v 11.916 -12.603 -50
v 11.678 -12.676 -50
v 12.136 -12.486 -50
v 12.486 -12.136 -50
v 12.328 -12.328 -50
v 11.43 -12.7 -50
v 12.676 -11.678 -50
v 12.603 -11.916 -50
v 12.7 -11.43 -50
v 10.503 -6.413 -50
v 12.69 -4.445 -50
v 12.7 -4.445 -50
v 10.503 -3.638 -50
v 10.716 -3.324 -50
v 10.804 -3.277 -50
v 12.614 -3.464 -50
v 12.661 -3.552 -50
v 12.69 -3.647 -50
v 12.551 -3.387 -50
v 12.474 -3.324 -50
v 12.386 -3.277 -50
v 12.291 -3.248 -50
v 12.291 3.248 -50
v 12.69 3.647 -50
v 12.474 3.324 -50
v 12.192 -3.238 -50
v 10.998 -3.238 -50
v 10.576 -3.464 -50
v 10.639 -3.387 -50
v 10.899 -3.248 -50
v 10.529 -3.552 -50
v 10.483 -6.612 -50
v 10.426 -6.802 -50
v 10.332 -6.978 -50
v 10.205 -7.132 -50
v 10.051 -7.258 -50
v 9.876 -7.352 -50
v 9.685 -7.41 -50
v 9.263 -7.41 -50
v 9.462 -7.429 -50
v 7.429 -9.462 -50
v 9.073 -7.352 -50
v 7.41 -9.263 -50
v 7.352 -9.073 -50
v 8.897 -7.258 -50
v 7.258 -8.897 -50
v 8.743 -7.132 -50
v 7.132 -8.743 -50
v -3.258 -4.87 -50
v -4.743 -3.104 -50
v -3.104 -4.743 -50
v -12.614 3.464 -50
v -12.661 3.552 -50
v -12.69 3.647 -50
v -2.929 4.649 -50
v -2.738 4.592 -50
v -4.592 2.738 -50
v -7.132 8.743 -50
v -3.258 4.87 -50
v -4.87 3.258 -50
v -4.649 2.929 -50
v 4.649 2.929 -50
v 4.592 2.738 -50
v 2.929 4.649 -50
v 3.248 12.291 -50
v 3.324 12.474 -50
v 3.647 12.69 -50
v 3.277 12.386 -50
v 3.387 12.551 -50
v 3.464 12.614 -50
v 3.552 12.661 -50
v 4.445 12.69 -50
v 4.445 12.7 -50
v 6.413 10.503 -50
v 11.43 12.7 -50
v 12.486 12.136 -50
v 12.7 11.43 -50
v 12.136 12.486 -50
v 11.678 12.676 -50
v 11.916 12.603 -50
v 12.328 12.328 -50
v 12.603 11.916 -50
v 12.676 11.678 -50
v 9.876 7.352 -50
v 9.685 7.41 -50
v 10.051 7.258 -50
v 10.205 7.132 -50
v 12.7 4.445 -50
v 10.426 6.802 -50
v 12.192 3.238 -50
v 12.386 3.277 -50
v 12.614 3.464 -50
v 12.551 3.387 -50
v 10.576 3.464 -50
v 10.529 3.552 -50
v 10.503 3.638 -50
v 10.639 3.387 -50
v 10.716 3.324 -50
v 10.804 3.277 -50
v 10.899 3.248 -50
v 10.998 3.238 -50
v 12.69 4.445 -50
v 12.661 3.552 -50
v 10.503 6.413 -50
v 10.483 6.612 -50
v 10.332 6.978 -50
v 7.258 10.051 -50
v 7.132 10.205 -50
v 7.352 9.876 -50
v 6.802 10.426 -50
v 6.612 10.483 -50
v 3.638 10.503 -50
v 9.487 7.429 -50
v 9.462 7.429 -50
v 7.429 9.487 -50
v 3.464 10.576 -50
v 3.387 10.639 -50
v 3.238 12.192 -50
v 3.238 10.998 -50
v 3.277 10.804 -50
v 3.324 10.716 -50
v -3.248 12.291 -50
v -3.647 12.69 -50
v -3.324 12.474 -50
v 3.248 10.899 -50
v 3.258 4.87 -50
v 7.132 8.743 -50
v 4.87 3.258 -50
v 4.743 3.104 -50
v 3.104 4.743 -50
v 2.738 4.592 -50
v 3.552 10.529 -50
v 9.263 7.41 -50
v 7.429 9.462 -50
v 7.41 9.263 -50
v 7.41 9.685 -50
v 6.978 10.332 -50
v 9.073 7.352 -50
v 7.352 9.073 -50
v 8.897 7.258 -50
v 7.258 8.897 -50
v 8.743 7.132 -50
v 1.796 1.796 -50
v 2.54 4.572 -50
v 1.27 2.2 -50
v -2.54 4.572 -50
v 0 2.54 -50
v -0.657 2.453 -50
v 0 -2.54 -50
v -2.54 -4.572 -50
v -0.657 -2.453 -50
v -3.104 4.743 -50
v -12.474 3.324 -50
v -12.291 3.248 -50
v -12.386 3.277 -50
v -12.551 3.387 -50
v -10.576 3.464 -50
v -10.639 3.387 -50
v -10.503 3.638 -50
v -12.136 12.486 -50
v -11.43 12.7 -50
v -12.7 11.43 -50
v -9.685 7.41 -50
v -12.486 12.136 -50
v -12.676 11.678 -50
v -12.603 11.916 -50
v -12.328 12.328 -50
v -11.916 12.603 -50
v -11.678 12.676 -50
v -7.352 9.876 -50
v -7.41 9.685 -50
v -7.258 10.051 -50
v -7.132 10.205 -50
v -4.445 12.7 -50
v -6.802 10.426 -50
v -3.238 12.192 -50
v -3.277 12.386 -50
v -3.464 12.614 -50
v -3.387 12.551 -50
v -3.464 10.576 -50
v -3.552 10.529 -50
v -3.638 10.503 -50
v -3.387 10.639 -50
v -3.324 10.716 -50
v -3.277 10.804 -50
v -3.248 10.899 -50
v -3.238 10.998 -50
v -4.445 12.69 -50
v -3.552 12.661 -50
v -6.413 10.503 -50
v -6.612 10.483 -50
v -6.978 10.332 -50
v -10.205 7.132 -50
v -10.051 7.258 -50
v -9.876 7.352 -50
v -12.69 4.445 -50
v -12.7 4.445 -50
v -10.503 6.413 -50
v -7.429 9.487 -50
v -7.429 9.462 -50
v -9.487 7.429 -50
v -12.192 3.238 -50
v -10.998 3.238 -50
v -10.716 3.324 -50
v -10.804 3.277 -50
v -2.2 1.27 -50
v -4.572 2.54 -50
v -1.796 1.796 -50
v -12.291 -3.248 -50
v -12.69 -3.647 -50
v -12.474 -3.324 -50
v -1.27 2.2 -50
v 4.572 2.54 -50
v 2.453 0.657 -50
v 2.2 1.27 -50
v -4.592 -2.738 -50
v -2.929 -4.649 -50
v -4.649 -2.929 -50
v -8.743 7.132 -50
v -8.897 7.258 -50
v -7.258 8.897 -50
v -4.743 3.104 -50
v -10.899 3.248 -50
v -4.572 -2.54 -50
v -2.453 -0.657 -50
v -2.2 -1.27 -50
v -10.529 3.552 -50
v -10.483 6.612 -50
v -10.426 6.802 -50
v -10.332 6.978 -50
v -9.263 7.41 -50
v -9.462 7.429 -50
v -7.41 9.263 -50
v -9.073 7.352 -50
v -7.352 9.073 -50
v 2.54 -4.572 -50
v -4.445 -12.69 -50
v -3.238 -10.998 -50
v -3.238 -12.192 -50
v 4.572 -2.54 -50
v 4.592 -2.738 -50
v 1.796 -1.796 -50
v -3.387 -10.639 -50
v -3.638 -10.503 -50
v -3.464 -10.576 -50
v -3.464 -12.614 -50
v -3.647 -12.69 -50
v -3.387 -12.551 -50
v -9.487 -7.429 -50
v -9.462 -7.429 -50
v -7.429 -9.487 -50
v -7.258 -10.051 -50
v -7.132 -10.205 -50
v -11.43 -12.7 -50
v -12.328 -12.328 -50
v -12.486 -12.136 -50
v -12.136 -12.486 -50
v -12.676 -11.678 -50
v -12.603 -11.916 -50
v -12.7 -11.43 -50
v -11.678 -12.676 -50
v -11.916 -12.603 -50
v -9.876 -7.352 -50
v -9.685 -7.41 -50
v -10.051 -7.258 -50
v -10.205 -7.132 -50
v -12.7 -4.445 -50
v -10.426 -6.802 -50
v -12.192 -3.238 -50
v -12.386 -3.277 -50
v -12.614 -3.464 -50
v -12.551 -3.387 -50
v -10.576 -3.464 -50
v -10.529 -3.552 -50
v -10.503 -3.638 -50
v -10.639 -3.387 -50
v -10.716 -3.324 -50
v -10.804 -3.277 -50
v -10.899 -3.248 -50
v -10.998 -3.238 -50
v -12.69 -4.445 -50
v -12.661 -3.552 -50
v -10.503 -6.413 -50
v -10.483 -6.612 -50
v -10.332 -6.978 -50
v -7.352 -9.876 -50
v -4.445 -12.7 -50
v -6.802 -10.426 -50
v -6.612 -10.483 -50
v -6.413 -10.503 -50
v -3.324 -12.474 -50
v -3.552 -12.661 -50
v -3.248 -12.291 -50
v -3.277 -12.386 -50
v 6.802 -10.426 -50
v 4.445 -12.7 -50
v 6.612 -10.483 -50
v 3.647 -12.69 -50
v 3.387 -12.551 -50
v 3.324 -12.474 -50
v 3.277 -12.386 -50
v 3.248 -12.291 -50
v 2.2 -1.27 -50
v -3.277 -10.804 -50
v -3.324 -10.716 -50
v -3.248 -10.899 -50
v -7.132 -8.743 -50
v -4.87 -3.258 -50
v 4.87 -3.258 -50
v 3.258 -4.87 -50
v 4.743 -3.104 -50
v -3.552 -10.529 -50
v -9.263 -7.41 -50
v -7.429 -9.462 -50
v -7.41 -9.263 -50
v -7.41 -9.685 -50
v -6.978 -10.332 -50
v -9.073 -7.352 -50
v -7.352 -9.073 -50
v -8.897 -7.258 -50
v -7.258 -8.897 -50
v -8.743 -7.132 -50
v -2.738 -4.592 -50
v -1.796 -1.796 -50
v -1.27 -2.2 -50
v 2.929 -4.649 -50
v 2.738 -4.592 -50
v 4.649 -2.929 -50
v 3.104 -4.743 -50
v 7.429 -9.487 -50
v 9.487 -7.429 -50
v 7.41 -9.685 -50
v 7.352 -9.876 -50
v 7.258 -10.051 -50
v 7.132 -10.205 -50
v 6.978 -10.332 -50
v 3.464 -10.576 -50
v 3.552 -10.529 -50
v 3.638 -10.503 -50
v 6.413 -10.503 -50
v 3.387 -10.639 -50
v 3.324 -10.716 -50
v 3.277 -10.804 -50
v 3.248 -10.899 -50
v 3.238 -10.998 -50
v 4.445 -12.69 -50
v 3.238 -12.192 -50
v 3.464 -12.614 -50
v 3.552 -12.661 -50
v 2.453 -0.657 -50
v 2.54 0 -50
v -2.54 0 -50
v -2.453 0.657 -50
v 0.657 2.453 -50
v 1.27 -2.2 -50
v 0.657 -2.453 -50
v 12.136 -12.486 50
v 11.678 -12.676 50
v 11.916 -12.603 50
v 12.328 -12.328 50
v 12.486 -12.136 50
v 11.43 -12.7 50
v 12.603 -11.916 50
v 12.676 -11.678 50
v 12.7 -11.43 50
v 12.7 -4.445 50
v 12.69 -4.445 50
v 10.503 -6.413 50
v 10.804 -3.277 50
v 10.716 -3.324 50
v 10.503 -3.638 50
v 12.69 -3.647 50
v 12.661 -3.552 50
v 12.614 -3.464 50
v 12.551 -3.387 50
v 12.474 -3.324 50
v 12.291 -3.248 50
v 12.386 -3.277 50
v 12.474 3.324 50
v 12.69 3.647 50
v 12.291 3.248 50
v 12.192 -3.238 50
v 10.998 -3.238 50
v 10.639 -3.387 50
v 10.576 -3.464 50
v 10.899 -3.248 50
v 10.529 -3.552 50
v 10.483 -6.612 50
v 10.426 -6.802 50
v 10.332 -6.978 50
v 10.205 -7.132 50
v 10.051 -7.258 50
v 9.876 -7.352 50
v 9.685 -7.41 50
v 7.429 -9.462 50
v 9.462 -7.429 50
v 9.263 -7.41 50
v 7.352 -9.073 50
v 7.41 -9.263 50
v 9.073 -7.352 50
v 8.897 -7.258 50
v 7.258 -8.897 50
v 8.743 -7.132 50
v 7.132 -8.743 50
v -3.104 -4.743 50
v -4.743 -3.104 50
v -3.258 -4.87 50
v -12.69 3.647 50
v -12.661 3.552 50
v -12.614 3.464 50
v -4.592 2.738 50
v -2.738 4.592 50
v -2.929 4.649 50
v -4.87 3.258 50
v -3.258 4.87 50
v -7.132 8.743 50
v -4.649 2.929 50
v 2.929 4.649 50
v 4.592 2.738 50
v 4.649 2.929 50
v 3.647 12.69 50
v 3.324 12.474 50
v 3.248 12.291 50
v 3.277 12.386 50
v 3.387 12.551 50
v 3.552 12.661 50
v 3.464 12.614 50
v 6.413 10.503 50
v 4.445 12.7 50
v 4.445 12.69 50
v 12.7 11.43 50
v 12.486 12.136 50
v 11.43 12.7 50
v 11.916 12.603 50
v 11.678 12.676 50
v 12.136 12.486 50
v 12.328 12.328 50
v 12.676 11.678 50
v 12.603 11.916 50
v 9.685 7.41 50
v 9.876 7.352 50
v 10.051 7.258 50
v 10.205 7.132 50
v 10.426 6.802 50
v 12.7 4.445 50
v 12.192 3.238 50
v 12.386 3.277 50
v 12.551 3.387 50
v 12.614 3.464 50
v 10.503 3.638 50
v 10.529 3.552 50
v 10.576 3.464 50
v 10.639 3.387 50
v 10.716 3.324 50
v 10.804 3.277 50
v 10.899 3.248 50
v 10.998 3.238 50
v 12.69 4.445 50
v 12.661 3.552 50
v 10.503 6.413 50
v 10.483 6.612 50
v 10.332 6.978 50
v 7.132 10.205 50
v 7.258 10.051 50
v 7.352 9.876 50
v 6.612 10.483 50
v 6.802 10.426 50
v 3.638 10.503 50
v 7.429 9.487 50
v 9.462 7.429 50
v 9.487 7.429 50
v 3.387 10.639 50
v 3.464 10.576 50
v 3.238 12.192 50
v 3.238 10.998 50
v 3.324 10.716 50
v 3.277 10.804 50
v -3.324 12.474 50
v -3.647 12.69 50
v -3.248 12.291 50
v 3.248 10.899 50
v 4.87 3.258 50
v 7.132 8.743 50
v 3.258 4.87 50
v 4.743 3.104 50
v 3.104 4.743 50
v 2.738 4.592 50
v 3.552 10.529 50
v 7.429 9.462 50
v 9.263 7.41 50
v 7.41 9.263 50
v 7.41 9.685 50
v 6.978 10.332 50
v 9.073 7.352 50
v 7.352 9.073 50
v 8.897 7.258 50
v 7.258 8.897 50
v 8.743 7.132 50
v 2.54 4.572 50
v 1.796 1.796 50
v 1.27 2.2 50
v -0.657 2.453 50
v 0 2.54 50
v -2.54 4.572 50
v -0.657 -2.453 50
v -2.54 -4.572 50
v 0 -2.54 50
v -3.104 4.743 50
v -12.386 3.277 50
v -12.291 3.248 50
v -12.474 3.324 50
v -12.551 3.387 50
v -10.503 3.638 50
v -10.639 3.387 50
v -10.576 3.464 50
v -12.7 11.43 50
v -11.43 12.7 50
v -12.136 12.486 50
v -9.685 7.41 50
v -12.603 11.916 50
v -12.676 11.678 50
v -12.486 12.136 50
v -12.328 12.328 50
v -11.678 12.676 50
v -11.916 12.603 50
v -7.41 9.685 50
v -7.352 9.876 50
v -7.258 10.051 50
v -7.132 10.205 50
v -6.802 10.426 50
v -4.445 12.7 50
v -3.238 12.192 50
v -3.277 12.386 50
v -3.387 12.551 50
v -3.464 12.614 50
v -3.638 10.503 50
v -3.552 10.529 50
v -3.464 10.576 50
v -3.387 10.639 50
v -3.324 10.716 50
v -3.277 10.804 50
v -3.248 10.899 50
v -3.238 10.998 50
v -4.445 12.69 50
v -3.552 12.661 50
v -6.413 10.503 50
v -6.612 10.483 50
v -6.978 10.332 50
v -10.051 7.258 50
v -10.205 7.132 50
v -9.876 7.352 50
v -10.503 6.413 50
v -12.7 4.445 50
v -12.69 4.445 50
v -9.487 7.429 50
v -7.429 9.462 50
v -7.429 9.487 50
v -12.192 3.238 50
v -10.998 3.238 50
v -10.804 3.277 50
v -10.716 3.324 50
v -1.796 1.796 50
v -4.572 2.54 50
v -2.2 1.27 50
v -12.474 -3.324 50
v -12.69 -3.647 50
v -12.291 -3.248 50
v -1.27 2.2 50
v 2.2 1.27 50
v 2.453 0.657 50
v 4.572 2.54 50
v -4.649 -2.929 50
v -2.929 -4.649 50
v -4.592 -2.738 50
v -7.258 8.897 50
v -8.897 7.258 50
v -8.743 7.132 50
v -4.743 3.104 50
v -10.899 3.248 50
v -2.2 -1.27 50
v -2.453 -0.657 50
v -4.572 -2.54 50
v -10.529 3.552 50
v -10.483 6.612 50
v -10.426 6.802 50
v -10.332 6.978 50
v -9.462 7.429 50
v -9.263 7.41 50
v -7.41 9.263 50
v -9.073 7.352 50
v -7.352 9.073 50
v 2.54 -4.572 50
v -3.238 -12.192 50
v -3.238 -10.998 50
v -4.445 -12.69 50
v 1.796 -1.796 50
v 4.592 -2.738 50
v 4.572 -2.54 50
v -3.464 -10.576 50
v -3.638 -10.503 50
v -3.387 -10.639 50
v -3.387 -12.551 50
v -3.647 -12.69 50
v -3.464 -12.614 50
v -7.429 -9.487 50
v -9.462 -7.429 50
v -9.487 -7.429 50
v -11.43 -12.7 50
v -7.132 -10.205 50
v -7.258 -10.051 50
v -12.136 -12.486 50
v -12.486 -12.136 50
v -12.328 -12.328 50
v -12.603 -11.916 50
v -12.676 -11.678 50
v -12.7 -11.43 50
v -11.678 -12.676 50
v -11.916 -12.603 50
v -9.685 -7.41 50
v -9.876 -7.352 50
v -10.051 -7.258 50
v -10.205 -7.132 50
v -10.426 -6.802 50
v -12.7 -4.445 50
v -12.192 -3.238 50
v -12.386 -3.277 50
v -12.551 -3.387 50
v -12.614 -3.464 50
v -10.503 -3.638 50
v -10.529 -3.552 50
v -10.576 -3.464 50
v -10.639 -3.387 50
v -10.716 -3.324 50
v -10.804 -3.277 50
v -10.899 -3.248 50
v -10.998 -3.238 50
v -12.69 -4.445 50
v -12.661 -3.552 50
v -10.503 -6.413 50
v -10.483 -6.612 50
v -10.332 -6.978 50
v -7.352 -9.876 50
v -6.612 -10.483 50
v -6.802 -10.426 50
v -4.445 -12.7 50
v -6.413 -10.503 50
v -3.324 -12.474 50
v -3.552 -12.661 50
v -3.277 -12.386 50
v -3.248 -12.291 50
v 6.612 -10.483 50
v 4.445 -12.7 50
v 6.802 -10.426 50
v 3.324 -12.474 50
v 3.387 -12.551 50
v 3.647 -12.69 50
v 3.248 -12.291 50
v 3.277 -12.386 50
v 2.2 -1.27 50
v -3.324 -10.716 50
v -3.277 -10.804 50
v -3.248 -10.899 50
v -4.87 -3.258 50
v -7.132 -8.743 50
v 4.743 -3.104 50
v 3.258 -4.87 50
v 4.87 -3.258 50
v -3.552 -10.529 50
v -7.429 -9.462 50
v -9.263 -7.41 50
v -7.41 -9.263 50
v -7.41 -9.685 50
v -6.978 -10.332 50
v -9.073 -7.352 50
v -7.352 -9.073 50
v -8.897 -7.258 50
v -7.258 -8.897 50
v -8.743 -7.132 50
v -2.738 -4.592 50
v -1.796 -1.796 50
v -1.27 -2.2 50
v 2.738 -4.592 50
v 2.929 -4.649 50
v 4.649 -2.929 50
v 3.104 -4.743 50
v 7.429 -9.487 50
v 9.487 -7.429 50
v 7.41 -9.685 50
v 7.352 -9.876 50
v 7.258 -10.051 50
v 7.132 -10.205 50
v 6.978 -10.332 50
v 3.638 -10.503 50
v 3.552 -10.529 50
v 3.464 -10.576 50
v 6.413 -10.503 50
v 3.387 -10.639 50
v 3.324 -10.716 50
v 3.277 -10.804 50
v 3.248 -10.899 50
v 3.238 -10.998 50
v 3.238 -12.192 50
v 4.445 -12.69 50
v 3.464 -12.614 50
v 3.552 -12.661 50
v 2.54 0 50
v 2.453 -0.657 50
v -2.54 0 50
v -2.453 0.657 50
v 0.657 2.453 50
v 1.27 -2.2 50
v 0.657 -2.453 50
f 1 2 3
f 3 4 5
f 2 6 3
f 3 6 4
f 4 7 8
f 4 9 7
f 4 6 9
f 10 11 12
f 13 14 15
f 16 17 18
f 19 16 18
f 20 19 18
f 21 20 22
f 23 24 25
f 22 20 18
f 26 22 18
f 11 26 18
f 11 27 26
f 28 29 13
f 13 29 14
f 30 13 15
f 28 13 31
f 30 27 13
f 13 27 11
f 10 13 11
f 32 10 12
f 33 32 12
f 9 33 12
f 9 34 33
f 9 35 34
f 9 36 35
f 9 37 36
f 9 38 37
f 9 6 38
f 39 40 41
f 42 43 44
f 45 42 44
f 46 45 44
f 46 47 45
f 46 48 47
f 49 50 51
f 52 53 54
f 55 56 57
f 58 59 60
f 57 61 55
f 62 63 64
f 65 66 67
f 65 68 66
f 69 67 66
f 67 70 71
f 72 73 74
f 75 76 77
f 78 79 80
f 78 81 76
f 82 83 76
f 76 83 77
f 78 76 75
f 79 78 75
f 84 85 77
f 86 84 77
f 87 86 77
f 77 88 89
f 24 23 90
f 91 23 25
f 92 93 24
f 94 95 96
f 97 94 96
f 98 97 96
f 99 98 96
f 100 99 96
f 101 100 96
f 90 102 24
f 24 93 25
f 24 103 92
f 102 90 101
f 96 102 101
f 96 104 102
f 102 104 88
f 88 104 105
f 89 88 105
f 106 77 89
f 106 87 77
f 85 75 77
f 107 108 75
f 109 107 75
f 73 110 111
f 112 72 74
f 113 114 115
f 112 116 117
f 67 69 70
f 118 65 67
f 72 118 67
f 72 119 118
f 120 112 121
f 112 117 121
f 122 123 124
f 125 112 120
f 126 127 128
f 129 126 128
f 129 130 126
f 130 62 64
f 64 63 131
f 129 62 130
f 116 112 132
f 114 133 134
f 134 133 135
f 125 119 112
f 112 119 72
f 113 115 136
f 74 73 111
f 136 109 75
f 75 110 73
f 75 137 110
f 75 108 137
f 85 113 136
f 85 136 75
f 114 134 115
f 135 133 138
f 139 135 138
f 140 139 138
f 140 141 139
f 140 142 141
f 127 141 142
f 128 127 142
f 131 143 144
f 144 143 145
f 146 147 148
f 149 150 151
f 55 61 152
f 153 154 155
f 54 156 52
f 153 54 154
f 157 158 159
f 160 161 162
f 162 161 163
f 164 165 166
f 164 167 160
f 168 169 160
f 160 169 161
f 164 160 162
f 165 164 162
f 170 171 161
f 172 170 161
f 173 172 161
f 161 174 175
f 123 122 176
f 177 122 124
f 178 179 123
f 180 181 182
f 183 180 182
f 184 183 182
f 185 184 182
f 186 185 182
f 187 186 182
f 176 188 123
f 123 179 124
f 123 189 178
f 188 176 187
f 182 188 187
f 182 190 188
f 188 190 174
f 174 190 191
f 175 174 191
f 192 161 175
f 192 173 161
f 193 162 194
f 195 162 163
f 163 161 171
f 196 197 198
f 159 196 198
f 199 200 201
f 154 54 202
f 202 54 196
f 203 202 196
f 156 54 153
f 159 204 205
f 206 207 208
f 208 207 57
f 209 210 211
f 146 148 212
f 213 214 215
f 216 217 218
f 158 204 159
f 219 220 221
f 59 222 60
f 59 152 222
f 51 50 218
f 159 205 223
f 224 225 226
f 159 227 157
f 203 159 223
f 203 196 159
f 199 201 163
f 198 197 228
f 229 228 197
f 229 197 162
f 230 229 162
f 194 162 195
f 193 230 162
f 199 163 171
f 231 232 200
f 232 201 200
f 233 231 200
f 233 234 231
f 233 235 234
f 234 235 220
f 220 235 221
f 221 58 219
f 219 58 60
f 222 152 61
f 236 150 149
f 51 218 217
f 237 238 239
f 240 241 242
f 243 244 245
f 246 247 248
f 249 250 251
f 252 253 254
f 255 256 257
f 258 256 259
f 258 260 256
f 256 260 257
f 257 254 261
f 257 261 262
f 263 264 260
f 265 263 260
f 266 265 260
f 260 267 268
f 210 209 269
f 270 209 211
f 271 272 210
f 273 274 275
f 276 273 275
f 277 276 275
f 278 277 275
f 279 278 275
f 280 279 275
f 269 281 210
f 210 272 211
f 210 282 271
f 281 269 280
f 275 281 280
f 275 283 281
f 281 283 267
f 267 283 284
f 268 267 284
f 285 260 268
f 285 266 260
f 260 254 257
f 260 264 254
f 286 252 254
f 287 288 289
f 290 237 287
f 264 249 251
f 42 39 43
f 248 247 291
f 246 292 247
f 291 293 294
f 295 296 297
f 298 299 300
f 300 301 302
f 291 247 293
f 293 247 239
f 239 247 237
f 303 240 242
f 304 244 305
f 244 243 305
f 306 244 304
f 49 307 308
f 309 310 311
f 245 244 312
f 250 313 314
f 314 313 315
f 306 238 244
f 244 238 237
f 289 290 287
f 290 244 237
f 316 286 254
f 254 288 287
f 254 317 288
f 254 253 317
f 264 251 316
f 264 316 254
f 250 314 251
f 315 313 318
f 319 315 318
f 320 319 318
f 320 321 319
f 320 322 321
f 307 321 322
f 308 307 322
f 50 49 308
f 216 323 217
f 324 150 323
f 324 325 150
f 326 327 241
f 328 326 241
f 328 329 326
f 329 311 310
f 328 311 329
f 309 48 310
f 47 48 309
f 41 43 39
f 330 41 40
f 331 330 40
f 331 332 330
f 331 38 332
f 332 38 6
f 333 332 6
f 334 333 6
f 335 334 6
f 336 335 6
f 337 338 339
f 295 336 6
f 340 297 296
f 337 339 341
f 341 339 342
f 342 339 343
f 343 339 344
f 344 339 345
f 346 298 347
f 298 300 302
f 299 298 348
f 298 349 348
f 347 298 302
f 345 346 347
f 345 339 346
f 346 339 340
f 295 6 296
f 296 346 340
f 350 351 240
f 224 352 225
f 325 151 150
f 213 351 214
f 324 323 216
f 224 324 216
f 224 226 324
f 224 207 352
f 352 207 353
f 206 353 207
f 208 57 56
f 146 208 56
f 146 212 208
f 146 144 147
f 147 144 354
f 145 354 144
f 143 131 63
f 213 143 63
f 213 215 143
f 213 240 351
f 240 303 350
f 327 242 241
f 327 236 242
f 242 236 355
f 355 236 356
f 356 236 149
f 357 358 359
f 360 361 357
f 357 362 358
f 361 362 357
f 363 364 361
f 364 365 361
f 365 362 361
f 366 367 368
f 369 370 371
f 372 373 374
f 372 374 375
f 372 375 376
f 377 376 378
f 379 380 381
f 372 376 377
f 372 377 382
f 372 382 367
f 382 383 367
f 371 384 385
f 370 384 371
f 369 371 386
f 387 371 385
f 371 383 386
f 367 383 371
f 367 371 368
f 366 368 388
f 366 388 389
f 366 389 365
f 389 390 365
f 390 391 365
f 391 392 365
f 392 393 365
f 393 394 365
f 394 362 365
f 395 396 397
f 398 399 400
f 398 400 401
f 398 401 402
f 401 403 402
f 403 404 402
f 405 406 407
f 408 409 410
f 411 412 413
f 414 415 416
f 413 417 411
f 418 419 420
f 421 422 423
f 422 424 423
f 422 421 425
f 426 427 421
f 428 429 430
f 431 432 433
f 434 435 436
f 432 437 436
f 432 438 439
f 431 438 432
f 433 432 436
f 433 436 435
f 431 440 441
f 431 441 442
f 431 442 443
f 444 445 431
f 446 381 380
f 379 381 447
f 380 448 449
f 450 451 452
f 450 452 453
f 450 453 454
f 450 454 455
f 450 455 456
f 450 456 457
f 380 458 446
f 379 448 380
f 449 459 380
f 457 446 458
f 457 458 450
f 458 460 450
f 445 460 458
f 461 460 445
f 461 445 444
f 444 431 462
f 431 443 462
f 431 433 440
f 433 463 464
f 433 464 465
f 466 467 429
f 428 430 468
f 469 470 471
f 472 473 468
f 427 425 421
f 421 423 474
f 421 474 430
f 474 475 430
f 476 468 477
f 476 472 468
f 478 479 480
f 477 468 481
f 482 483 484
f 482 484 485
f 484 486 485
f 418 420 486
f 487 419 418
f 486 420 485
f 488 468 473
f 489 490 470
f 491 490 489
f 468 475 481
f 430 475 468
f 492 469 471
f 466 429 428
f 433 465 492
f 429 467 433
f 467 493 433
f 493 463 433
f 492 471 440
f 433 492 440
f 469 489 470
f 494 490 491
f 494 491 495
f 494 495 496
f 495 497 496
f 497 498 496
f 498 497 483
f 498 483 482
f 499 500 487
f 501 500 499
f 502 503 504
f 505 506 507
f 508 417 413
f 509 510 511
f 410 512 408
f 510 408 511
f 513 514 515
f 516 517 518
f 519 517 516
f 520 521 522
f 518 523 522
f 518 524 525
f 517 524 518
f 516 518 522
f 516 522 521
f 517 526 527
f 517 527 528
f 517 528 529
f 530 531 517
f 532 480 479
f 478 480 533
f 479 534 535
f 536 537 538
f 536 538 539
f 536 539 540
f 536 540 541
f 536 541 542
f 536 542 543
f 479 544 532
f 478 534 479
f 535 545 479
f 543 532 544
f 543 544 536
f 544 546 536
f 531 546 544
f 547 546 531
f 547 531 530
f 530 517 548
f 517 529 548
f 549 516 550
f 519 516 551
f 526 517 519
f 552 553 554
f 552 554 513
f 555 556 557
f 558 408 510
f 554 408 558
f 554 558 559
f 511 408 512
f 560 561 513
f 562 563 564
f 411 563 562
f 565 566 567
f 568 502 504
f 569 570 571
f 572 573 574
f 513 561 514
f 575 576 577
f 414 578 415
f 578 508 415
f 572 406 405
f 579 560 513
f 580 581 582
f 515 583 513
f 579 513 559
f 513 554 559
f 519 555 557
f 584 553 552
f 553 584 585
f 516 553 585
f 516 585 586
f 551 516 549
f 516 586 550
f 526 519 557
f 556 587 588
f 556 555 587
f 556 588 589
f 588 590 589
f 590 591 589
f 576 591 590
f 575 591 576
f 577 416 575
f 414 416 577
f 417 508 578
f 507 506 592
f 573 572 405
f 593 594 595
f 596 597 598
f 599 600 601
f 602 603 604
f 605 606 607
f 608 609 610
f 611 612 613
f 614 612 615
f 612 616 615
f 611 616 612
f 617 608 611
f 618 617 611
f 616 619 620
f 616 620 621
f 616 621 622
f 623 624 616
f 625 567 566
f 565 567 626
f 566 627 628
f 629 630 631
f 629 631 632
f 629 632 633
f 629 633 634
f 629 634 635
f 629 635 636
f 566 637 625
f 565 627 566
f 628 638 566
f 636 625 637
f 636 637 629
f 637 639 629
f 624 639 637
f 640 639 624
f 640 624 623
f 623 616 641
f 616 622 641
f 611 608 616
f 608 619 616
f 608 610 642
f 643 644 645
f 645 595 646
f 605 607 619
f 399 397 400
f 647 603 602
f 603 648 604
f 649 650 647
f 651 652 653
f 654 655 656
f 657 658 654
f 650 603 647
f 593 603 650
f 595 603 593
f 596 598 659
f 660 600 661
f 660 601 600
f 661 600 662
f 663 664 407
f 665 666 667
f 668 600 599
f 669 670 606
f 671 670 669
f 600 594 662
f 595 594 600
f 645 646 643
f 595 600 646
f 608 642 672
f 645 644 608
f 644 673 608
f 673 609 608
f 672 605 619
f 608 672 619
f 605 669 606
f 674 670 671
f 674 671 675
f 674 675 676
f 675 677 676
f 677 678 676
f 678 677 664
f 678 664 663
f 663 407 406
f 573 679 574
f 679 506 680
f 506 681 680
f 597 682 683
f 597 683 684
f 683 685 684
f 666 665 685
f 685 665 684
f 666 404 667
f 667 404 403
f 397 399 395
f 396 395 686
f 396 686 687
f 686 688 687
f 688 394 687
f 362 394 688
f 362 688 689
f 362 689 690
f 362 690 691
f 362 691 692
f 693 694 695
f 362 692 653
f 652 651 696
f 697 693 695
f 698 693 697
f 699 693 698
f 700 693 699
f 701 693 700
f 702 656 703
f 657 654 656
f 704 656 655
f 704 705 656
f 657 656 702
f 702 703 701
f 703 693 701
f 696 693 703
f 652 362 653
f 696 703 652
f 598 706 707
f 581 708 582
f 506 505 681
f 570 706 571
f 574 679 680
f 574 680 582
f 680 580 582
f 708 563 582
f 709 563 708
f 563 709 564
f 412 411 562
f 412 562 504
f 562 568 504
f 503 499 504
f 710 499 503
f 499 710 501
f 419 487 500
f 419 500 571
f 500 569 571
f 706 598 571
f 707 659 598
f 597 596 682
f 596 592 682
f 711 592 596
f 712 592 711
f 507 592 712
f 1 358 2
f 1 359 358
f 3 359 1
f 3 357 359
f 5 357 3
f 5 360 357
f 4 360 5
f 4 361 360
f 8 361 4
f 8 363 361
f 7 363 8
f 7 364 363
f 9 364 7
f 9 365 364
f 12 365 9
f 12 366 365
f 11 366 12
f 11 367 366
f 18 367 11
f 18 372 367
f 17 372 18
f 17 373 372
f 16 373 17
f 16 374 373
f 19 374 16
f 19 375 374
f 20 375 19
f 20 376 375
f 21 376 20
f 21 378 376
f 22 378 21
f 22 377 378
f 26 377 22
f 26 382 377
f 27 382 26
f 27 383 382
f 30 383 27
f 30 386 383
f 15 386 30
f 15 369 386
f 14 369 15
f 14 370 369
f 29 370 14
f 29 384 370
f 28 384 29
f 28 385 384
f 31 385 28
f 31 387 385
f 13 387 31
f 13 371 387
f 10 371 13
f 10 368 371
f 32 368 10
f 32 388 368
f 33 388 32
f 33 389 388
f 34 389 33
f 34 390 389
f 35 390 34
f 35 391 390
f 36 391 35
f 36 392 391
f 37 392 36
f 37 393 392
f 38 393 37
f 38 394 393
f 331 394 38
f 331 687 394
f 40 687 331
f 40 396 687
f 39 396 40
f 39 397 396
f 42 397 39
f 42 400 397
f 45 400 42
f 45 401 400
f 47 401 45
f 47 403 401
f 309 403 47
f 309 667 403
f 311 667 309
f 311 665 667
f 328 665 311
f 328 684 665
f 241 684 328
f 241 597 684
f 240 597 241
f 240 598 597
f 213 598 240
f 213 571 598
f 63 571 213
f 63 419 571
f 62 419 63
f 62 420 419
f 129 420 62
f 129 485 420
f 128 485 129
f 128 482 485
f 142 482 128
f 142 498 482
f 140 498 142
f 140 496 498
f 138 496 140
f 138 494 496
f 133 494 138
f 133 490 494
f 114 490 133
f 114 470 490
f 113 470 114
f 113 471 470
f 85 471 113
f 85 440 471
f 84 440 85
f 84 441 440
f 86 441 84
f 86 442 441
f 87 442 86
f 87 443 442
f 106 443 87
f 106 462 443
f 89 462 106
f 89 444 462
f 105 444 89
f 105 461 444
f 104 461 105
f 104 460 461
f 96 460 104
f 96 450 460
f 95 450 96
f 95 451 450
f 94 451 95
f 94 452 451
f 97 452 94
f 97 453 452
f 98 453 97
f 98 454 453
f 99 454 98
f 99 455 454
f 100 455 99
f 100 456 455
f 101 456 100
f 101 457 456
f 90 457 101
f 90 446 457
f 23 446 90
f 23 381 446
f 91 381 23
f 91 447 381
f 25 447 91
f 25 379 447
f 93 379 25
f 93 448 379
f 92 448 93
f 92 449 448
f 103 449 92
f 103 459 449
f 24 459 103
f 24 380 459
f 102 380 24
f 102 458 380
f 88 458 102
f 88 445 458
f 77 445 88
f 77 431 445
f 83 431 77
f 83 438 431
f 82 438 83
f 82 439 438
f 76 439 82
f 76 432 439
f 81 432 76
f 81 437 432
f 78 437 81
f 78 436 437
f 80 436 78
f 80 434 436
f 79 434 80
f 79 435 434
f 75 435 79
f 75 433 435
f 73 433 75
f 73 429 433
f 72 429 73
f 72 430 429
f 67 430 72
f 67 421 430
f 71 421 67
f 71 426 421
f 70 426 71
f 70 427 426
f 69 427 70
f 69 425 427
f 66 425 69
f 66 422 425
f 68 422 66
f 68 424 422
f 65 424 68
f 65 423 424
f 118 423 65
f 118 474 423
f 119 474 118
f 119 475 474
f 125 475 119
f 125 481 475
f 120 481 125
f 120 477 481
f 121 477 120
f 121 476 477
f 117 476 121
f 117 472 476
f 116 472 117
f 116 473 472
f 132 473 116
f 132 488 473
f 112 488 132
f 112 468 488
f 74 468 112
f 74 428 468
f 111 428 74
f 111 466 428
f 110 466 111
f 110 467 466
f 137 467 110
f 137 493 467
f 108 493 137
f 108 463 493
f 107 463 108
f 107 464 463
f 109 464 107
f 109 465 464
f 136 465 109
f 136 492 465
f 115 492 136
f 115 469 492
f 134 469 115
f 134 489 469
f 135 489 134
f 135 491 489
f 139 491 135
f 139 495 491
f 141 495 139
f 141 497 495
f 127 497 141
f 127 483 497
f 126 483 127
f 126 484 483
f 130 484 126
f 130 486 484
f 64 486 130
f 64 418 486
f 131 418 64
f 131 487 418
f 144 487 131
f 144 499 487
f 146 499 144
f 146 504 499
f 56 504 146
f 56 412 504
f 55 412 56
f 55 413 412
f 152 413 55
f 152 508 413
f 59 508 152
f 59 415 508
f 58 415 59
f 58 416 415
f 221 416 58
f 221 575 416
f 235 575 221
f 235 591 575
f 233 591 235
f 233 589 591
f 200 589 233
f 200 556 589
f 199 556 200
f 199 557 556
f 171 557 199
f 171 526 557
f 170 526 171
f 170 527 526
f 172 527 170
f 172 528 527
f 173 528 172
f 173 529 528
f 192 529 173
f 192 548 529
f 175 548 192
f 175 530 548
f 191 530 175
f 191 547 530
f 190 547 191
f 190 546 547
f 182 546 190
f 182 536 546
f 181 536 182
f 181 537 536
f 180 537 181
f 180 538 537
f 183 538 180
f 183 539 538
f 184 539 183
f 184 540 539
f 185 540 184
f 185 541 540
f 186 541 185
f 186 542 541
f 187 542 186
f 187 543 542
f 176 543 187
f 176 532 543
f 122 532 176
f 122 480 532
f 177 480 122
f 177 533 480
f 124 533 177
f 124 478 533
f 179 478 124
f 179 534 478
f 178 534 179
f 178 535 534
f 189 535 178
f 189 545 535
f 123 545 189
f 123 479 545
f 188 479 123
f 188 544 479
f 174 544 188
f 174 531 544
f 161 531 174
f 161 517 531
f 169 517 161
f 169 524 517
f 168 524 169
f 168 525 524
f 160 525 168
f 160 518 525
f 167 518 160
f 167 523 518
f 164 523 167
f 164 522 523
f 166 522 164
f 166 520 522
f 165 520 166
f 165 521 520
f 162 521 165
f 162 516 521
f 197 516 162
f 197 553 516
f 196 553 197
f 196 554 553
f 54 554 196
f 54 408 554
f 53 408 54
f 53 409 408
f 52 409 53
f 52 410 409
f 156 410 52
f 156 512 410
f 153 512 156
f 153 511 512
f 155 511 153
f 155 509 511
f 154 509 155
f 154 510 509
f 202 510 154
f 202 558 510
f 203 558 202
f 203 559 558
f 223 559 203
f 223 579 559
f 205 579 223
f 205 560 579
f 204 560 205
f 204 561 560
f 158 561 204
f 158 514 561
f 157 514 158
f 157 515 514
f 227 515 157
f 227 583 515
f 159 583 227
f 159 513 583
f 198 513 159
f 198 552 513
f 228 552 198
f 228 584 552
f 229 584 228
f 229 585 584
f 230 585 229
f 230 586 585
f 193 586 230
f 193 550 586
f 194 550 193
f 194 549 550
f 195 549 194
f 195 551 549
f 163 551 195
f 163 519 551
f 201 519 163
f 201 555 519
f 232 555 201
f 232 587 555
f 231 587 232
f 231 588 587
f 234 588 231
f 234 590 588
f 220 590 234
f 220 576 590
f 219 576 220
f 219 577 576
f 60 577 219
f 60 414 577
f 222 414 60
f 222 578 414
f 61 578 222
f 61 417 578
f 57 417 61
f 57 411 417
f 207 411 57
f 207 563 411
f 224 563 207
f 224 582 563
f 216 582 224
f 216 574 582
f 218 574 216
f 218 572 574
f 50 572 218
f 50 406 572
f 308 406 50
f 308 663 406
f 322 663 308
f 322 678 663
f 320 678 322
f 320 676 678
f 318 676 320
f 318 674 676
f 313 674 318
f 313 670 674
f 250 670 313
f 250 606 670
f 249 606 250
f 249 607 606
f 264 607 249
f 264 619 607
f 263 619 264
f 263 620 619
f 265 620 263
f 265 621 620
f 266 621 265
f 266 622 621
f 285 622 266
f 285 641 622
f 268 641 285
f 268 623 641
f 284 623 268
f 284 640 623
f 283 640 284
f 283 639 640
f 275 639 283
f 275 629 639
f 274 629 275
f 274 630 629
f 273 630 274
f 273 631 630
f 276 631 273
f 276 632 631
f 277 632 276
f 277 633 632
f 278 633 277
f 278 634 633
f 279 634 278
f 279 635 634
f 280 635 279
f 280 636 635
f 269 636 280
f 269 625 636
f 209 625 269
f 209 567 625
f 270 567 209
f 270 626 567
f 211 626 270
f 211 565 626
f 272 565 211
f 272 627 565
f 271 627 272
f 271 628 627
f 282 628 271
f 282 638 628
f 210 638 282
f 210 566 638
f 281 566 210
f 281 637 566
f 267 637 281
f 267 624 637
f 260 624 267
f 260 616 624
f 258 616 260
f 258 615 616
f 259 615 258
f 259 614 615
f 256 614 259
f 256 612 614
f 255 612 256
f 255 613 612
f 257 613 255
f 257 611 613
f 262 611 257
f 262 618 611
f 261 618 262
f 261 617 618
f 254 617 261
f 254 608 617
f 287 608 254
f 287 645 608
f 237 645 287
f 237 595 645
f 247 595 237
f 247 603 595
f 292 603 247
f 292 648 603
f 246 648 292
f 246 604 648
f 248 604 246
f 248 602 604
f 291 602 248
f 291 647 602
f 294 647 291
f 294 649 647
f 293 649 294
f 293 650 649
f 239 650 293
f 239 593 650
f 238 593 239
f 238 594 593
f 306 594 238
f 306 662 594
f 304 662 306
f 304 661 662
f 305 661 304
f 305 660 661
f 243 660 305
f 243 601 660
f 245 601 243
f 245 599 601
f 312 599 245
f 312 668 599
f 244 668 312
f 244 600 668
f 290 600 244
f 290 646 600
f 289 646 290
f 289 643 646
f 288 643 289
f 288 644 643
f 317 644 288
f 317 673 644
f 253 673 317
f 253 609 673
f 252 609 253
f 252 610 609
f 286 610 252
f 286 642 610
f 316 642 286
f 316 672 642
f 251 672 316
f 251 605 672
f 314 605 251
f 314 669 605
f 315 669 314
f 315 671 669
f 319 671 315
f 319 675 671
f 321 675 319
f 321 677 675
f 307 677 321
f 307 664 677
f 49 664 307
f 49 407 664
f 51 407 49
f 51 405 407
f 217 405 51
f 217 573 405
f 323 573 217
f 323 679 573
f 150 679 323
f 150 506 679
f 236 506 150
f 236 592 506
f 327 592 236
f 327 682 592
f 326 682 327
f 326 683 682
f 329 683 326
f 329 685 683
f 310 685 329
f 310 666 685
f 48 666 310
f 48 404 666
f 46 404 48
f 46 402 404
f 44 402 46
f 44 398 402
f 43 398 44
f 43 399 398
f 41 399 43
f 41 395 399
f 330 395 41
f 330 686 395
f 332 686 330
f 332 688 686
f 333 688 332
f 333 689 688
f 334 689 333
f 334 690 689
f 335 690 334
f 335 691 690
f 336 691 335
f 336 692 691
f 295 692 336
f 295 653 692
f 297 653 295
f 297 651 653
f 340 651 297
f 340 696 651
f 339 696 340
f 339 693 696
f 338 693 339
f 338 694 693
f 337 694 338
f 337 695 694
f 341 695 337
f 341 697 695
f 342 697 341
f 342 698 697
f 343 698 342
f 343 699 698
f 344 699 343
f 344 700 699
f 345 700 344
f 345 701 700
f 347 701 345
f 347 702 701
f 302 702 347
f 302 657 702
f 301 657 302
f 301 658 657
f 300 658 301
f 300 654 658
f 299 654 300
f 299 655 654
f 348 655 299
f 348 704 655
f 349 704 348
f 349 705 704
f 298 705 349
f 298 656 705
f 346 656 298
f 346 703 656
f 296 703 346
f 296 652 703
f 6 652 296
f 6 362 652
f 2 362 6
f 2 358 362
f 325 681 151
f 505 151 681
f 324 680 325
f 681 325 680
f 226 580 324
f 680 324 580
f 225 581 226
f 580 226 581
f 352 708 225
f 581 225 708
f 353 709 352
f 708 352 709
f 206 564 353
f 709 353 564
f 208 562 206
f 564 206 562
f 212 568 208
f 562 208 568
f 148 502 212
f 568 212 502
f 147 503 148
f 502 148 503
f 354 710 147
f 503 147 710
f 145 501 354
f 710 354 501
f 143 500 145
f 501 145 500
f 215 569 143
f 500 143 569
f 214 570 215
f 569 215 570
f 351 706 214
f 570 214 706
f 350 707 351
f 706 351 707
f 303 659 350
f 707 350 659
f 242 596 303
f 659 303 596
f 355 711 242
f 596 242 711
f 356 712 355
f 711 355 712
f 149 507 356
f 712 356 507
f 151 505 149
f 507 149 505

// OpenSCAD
/*
*   Generic library for fractional t-slot extrusions.
*   Rev. 1
*
*  Creative Commons Share Alike 3.0
*  Copyright (c) 2013 David Lee Miller
* 
*/

minkR_TS = 0.04*25.4;   // minkowski radius for the t-slot
minkR_IC = 0.075*25.4;   // minkowski radius for the inner cutout
minkR_PF = 0.05*25.4;   // minkowski radius for the profile corners

1010Profile(100);
//1020Profile(100);
//1030Profile(100);
//2020Profile(100);
//2040Profile(100);


module fillet(rad){
	translate([-rad,-rad,0])
	difference(){
		translate([0,0,0]) square([rad+0.01,rad+0.01]);
		circle(r=rad,center=true,$fn=32);
	}
}

module insideCutout(){
	minkowski(){
		translate([0,0,0]) circle(r=minkR_IC,center=true,$fn=32);
		hull(){
			square([0.2*25.4-minkR_IC,0.645*25.4-2*minkR_IC],center=true);
			square([0.8*25.4-2*minkR_IC,0.001*25.4],center=true);
		}
	}
}

module doubleCutout(){
	union(){
		minkowski(){
			translate([0,0,0]) circle(r=minkR_IC,center=true,$fn=32);
			union(){
			rotate([0,0,0]) hull(){
				translate([-0.5*25.4,0,0]) hull(){
					square([0.2*25.4-minkR_IC,0.645*25.4-2*minkR_IC],center=true);
					square([0.8*25.4-2*minkR_IC,0.001*25.4],center=true);
				}
				translate([0.5*25.4,0,0]) hull(){
					square([0.2*25.4-minkR_IC,0.645*25.4-2*minkR_IC],center=true);
					square([0.8*25.4-2*minkR_IC,0.001*25.4],center=true);
				}
			}
			rotate([0,0,90]) hull(){
				translate([-0.5*25.4,0,0]) hull(){
					square([0.2*25.4-minkR_IC,0.645*25.4-2*minkR_IC],center=true);
					square([0.8*25.4-2*minkR_IC,0.001*25.4],center=true);
				}
				translate([0.5*25.4,0,0]) hull(){
					square([0.2*25.4-minkR_IC,0.645*25.4-2*minkR_IC],center=true);
					square([0.8*25.4-2*minkR_IC,0.001*25.4],center=true);
				}
			}}
		}
		rotate([0,0,0]) translate([-0.645*25.4/2,-0.645*25.4/2,0]) fillet(minkR_IC);
		rotate([0,0,180]) translate([-0.645*25.4/2,-0.645*25.4/2,0]) fillet(minkR_IC);
		rotate([0,0,90]) translate([-0.645*25.4/2,-0.645*25.4/2,0]) fillet(minkR_IC);
		rotate([0,0,-90]) translate([-0.645*25.4/2,-0.645*25.4/2,0]) fillet(minkR_IC);
	}
}

module tSlot(){
	union(){
		translate([minkR_TS,0,0])
		minkowski(){
			translate([0,0,0]) circle(r=minkR_TS,center=true,$fn=32);
			hull(){
				square([0.001*25.4,0.585*25.4-2*minkR_TS],center=true);
				translate([(0.233*25.4-2*minkR_TS)/2,0,0]) square([0.233*25.4-2*minkR_TS,0.2*25.4],center=true);
			}
		}
	translate([-0.255*25.4/2+0.01,0,0]) square(0.255*25.4,center=true);
	translate([-0.35*25.4/2-0.087*25.4+0.01,0,0]) square(0.35*25.4,center=true);
	translate([0,-0.255*25.4/2,0]) fillet(minkR_TS/2);
	translate([-0.087*25.4,-.255*25.4/2,0]) rotate([0,0,90]) fillet(minkR_TS/2);
	scale([1,-1,1]) translate([0,-0.255*25.4/2,0]) fillet(minkR_TS/2);
	scale([1,-1,1]) translate([-0.087*25.4,-.255*25.4/2,0]) rotate([0,0,90]) fillet(minkR_TS/2);
	}
}

module 1010Profile(height){
    color("Gainsboro")
	linear_extrude(height=height,center=true)
	union(){
	difference(){
		minkowski(){
			translate([0,0,0]) circle(r=minkR_PF,center=true,$fn=32);
			square([1*25.4-2*minkR_PF,1*25.4-2*minkR_PF],center=true);
		}
		translate([0,0,0]) circle(r=0.2*25.4/2,$fn=24);
		translate([-0.5*25.4+0.087*25.4,0,0]) tSlot();
		rotate([0,0,180]) translate([-0.5*25.4+0.087*25.4,0,0]) tSlot();
		translate([0,-0.5*25.4+0.087*25.4,0]) rotate([0,0,90]) tSlot();
		translate([0,0.5*25.4-0.087*25.4,0]) rotate([0,0,-90]) tSlot();
	}}
}

module 1020Profile(height){
	linear_extrude(height=height,center=true)
	difference(){
		minkowski(){
			translate([0,0,0]) circle(r=minkR_PF,center=true,$fn=32);
			square([1*25.4-2*minkR_PF,2*25.4-2*minkR_PF],center=true);
		}
		translate([0,0.5*25.4,0]) circle(r=0.2*25.4/2,$fn=24);
		translate([0,-0.5*25.4,0]) circle(r=0.2*25.4/2,$fn=24);
		translate([0,0,0]) insideCutout();
		translate([-0.5*25.4+0.087*25.4,0.5*25.4,0]) tSlot();
		rotate([0,0,180]) translate([-0.5*25.4+0.087*25.4,0.5*25.4,0]) tSlot();
		translate([-0.5*25.4+0.087*25.4,-0.5*25.4,0]) tSlot();
		rotate([0,0,180]) translate([-0.5*25.4+0.087*25.4,-0.5*25.4,0]) tSlot();
		translate([0,-1*25.4+0.087*25.4,0]) rotate([0,0,90]) tSlot();
		translate([0,1*25.4-0.087*25.4,0]) rotate([0,0,-90]) tSlot();
	}
}

module 1030Profile(height){
	linear_extrude(height=height,center=true)
	difference(){
		minkowski(){
			translate([0,0,0]) circle(r=minkR_PF,center=true,$fn=32);
			square([1*25.4-2*minkR_PF,3*25.4-2*minkR_PF],center=true);
		}
		translate([0,0,0]) circle(r=0.2*25.4/2,$fn=24);
		translate([0,1*25.4,0]) circle(r=0.2*25.4/2,$fn=24);
		translate([0,-1*25.4,0]) circle(r=0.2*25.4/2,$fn=24);
		translate([0,-0.5*25.4,0]) insideCutout();
		translate([0,0.5*25.4,0]) insideCutout();
		translate([-0.5*25.4+0.087*25.4,0,0]) tSlot();
		rotate([0,0,180]) translate([-0.5*25.4+0.087*25.4,0,0]) tSlot();
		translate([-0.5*25.4+0.087*25.4,1*25.4,0]) tSlot();
		rotate([0,0,180]) translate([-0.5*25.4+0.087*25.4,1*25.4,0]) tSlot();
		translate([-0.5*25.4+0.087*25.4,-1*25.4,0]) tSlot();
		rotate([0,0,180]) translate([-0.5*25.4+0.087*25.4,-1*25.4,0]) tSlot();
		translate([0,-1.5*25.4+0.087*25.4,0]) rotate([0,0,90]) tSlot();
		translate([0,1.5*25.4-0.087*25.4,0]) rotate([0,0,-90]) tSlot();
	}
}

module 2020Profile(height){
	linear_extrude(height=height,center=true)
	difference(){
		minkowski(){
			translate([0,0,0]) circle(r=minkR_PF,center=true,$fn=32);
			square([2*25.4-2*minkR_PF,2*25.4-2*minkR_PF],center=true);
		}
		translate([0.5*25.4,0.5*25.4,0]) circle(r=0.2*25.4/2,$fn=24);
		translate([-0.5*25.4,0.5*25.4,0]) circle(r=0.2*25.4/2,$fn=24);
		translate([0.5*25.4,-0.5*25.4,0]) circle(r=0.2*25.4/2,$fn=24);
		translate([-0.5*25.4,-0.5*25.4,0]) circle(r=0.2*25.4/2,$fn=24);
		translate([0,0,0]) doubleCutout();
		translate([-1*25.4+0.087*25.4,0.5*25.4,0]) tSlot();
		rotate([0,0,180]) translate([-1*25.4+0.087*25.4,0.5*25.4,0]) tSlot();
		translate([-1*25.4+0.087*25.4,-0.5*25.4,0]) tSlot();
		rotate([0,0,180]) translate([-1*25.4+0.087*25.4,-0.5*25.4,0]) tSlot();
		translate([-0.5*25.4,1*25.4-0.087*25.4,0]) rotate([0,0,-90]) tSlot();
		rotate([0,0,180]) translate([-0.5*25.4,1*25.4-0.087*25.4,0]) rotate([0,0,-90]) tSlot();
		translate([0.5*25.4,1*25.4-0.087*25.4,0]) rotate([0,0,-90]) tSlot();
		rotate([0,0,180]) translate([0.5*25.4,1*25.4-0.087*25.4,0]) rotate([0,0,-90]) tSlot();
	}
}

module 2040Profile(height){
	linear_extrude(height=height,center=true)
	difference(){
		minkowski(){
			translate([0,0,0]) circle(r=minkR_PF,center=true,$fn=32);
			square([2*25.4-2*minkR_PF,4*25.4-2*minkR_PF],center=true);
		}
		translate([0.5*25.4,1.5*25.4,0]) circle(r=0.2*25.4/2,$fn=24);
		translate([-0.5*25.4,1.5*25.4,0]) circle(r=0.2*25.4/2,$fn=24);
		translate([0.5*25.4,0.5*25.4,0]) circle(r=0.2*25.4/2,$fn=24);
		translate([-0.5*25.4,0.5*25.4,0]) circle(r=0.2*25.4/2,$fn=24);
		translate([0.5*25.4,-1.5*25.4,0]) circle(r=0.2*25.4/2,$fn=24);
		translate([-0.5*25.4,-1.5*25.4,0]) circle(r=0.2*25.4/2,$fn=24);
		translate([0.5*25.4,-0.5*25.4,0]) circle(r=0.2*25.4/2,$fn=24);
		translate([-0.5*25.4,-0.5*25.4,0]) circle(r=0.2*25.4/2,$fn=24);
		translate([0,1*25.4,0]) doubleCutout();
		translate([0,-1*25.4,0]) doubleCutout();
		translate([0.5*25.4,0,0]) insideCutout();
		translate([-0.5*25.4,0,0]) insideCutout();
		translate([-1*25.4+0.087*25.4,0.5*25.4,0]) tSlot();
		rotate([0,0,180]) translate([-1*25.4+0.087*25.4,0.5*25.4,0]) tSlot();
		translate([-1*25.4+0.087*25.4,-0.5*25.4,0]) tSlot();
		rotate([0,0,180]) translate([-1*25.4+0.087*25.4,-0.5*25.4,0]) tSlot();
		translate([-1*25.4+0.087*25.4,1.5*25.4,0]) tSlot();
		rotate([0,0,180]) translate([-1*25.4+0.087*25.4,1.5*25.4,0]) tSlot();
		translate([-1*25.4+0.087*25.4,-1.5*25.4,0]) tSlot();
		rotate([0,0,180]) translate([-1*25.4+0.087*25.4,-1.5*25.4,0]) tSlot();
		translate([-0.5*25.4,2*25.4-0.087*25.4,0]) rotate([0,0,-90]) tSlot();
		rotate([0,0,180]) translate([-0.5*25.4,2*25.4-0.087*25.4,0]) rotate([0,0,-90]) tSlot();
		translate([0.5*25.4,2*25.4-0.087*25.4,0]) rotate([0,0,-90]) tSlot();
		rotate([0,0,180]) translate([0.5*25.4,2*25.4-0.087*25.4,0]) rotate([0,0,-90]) tSlot();
	}
}
